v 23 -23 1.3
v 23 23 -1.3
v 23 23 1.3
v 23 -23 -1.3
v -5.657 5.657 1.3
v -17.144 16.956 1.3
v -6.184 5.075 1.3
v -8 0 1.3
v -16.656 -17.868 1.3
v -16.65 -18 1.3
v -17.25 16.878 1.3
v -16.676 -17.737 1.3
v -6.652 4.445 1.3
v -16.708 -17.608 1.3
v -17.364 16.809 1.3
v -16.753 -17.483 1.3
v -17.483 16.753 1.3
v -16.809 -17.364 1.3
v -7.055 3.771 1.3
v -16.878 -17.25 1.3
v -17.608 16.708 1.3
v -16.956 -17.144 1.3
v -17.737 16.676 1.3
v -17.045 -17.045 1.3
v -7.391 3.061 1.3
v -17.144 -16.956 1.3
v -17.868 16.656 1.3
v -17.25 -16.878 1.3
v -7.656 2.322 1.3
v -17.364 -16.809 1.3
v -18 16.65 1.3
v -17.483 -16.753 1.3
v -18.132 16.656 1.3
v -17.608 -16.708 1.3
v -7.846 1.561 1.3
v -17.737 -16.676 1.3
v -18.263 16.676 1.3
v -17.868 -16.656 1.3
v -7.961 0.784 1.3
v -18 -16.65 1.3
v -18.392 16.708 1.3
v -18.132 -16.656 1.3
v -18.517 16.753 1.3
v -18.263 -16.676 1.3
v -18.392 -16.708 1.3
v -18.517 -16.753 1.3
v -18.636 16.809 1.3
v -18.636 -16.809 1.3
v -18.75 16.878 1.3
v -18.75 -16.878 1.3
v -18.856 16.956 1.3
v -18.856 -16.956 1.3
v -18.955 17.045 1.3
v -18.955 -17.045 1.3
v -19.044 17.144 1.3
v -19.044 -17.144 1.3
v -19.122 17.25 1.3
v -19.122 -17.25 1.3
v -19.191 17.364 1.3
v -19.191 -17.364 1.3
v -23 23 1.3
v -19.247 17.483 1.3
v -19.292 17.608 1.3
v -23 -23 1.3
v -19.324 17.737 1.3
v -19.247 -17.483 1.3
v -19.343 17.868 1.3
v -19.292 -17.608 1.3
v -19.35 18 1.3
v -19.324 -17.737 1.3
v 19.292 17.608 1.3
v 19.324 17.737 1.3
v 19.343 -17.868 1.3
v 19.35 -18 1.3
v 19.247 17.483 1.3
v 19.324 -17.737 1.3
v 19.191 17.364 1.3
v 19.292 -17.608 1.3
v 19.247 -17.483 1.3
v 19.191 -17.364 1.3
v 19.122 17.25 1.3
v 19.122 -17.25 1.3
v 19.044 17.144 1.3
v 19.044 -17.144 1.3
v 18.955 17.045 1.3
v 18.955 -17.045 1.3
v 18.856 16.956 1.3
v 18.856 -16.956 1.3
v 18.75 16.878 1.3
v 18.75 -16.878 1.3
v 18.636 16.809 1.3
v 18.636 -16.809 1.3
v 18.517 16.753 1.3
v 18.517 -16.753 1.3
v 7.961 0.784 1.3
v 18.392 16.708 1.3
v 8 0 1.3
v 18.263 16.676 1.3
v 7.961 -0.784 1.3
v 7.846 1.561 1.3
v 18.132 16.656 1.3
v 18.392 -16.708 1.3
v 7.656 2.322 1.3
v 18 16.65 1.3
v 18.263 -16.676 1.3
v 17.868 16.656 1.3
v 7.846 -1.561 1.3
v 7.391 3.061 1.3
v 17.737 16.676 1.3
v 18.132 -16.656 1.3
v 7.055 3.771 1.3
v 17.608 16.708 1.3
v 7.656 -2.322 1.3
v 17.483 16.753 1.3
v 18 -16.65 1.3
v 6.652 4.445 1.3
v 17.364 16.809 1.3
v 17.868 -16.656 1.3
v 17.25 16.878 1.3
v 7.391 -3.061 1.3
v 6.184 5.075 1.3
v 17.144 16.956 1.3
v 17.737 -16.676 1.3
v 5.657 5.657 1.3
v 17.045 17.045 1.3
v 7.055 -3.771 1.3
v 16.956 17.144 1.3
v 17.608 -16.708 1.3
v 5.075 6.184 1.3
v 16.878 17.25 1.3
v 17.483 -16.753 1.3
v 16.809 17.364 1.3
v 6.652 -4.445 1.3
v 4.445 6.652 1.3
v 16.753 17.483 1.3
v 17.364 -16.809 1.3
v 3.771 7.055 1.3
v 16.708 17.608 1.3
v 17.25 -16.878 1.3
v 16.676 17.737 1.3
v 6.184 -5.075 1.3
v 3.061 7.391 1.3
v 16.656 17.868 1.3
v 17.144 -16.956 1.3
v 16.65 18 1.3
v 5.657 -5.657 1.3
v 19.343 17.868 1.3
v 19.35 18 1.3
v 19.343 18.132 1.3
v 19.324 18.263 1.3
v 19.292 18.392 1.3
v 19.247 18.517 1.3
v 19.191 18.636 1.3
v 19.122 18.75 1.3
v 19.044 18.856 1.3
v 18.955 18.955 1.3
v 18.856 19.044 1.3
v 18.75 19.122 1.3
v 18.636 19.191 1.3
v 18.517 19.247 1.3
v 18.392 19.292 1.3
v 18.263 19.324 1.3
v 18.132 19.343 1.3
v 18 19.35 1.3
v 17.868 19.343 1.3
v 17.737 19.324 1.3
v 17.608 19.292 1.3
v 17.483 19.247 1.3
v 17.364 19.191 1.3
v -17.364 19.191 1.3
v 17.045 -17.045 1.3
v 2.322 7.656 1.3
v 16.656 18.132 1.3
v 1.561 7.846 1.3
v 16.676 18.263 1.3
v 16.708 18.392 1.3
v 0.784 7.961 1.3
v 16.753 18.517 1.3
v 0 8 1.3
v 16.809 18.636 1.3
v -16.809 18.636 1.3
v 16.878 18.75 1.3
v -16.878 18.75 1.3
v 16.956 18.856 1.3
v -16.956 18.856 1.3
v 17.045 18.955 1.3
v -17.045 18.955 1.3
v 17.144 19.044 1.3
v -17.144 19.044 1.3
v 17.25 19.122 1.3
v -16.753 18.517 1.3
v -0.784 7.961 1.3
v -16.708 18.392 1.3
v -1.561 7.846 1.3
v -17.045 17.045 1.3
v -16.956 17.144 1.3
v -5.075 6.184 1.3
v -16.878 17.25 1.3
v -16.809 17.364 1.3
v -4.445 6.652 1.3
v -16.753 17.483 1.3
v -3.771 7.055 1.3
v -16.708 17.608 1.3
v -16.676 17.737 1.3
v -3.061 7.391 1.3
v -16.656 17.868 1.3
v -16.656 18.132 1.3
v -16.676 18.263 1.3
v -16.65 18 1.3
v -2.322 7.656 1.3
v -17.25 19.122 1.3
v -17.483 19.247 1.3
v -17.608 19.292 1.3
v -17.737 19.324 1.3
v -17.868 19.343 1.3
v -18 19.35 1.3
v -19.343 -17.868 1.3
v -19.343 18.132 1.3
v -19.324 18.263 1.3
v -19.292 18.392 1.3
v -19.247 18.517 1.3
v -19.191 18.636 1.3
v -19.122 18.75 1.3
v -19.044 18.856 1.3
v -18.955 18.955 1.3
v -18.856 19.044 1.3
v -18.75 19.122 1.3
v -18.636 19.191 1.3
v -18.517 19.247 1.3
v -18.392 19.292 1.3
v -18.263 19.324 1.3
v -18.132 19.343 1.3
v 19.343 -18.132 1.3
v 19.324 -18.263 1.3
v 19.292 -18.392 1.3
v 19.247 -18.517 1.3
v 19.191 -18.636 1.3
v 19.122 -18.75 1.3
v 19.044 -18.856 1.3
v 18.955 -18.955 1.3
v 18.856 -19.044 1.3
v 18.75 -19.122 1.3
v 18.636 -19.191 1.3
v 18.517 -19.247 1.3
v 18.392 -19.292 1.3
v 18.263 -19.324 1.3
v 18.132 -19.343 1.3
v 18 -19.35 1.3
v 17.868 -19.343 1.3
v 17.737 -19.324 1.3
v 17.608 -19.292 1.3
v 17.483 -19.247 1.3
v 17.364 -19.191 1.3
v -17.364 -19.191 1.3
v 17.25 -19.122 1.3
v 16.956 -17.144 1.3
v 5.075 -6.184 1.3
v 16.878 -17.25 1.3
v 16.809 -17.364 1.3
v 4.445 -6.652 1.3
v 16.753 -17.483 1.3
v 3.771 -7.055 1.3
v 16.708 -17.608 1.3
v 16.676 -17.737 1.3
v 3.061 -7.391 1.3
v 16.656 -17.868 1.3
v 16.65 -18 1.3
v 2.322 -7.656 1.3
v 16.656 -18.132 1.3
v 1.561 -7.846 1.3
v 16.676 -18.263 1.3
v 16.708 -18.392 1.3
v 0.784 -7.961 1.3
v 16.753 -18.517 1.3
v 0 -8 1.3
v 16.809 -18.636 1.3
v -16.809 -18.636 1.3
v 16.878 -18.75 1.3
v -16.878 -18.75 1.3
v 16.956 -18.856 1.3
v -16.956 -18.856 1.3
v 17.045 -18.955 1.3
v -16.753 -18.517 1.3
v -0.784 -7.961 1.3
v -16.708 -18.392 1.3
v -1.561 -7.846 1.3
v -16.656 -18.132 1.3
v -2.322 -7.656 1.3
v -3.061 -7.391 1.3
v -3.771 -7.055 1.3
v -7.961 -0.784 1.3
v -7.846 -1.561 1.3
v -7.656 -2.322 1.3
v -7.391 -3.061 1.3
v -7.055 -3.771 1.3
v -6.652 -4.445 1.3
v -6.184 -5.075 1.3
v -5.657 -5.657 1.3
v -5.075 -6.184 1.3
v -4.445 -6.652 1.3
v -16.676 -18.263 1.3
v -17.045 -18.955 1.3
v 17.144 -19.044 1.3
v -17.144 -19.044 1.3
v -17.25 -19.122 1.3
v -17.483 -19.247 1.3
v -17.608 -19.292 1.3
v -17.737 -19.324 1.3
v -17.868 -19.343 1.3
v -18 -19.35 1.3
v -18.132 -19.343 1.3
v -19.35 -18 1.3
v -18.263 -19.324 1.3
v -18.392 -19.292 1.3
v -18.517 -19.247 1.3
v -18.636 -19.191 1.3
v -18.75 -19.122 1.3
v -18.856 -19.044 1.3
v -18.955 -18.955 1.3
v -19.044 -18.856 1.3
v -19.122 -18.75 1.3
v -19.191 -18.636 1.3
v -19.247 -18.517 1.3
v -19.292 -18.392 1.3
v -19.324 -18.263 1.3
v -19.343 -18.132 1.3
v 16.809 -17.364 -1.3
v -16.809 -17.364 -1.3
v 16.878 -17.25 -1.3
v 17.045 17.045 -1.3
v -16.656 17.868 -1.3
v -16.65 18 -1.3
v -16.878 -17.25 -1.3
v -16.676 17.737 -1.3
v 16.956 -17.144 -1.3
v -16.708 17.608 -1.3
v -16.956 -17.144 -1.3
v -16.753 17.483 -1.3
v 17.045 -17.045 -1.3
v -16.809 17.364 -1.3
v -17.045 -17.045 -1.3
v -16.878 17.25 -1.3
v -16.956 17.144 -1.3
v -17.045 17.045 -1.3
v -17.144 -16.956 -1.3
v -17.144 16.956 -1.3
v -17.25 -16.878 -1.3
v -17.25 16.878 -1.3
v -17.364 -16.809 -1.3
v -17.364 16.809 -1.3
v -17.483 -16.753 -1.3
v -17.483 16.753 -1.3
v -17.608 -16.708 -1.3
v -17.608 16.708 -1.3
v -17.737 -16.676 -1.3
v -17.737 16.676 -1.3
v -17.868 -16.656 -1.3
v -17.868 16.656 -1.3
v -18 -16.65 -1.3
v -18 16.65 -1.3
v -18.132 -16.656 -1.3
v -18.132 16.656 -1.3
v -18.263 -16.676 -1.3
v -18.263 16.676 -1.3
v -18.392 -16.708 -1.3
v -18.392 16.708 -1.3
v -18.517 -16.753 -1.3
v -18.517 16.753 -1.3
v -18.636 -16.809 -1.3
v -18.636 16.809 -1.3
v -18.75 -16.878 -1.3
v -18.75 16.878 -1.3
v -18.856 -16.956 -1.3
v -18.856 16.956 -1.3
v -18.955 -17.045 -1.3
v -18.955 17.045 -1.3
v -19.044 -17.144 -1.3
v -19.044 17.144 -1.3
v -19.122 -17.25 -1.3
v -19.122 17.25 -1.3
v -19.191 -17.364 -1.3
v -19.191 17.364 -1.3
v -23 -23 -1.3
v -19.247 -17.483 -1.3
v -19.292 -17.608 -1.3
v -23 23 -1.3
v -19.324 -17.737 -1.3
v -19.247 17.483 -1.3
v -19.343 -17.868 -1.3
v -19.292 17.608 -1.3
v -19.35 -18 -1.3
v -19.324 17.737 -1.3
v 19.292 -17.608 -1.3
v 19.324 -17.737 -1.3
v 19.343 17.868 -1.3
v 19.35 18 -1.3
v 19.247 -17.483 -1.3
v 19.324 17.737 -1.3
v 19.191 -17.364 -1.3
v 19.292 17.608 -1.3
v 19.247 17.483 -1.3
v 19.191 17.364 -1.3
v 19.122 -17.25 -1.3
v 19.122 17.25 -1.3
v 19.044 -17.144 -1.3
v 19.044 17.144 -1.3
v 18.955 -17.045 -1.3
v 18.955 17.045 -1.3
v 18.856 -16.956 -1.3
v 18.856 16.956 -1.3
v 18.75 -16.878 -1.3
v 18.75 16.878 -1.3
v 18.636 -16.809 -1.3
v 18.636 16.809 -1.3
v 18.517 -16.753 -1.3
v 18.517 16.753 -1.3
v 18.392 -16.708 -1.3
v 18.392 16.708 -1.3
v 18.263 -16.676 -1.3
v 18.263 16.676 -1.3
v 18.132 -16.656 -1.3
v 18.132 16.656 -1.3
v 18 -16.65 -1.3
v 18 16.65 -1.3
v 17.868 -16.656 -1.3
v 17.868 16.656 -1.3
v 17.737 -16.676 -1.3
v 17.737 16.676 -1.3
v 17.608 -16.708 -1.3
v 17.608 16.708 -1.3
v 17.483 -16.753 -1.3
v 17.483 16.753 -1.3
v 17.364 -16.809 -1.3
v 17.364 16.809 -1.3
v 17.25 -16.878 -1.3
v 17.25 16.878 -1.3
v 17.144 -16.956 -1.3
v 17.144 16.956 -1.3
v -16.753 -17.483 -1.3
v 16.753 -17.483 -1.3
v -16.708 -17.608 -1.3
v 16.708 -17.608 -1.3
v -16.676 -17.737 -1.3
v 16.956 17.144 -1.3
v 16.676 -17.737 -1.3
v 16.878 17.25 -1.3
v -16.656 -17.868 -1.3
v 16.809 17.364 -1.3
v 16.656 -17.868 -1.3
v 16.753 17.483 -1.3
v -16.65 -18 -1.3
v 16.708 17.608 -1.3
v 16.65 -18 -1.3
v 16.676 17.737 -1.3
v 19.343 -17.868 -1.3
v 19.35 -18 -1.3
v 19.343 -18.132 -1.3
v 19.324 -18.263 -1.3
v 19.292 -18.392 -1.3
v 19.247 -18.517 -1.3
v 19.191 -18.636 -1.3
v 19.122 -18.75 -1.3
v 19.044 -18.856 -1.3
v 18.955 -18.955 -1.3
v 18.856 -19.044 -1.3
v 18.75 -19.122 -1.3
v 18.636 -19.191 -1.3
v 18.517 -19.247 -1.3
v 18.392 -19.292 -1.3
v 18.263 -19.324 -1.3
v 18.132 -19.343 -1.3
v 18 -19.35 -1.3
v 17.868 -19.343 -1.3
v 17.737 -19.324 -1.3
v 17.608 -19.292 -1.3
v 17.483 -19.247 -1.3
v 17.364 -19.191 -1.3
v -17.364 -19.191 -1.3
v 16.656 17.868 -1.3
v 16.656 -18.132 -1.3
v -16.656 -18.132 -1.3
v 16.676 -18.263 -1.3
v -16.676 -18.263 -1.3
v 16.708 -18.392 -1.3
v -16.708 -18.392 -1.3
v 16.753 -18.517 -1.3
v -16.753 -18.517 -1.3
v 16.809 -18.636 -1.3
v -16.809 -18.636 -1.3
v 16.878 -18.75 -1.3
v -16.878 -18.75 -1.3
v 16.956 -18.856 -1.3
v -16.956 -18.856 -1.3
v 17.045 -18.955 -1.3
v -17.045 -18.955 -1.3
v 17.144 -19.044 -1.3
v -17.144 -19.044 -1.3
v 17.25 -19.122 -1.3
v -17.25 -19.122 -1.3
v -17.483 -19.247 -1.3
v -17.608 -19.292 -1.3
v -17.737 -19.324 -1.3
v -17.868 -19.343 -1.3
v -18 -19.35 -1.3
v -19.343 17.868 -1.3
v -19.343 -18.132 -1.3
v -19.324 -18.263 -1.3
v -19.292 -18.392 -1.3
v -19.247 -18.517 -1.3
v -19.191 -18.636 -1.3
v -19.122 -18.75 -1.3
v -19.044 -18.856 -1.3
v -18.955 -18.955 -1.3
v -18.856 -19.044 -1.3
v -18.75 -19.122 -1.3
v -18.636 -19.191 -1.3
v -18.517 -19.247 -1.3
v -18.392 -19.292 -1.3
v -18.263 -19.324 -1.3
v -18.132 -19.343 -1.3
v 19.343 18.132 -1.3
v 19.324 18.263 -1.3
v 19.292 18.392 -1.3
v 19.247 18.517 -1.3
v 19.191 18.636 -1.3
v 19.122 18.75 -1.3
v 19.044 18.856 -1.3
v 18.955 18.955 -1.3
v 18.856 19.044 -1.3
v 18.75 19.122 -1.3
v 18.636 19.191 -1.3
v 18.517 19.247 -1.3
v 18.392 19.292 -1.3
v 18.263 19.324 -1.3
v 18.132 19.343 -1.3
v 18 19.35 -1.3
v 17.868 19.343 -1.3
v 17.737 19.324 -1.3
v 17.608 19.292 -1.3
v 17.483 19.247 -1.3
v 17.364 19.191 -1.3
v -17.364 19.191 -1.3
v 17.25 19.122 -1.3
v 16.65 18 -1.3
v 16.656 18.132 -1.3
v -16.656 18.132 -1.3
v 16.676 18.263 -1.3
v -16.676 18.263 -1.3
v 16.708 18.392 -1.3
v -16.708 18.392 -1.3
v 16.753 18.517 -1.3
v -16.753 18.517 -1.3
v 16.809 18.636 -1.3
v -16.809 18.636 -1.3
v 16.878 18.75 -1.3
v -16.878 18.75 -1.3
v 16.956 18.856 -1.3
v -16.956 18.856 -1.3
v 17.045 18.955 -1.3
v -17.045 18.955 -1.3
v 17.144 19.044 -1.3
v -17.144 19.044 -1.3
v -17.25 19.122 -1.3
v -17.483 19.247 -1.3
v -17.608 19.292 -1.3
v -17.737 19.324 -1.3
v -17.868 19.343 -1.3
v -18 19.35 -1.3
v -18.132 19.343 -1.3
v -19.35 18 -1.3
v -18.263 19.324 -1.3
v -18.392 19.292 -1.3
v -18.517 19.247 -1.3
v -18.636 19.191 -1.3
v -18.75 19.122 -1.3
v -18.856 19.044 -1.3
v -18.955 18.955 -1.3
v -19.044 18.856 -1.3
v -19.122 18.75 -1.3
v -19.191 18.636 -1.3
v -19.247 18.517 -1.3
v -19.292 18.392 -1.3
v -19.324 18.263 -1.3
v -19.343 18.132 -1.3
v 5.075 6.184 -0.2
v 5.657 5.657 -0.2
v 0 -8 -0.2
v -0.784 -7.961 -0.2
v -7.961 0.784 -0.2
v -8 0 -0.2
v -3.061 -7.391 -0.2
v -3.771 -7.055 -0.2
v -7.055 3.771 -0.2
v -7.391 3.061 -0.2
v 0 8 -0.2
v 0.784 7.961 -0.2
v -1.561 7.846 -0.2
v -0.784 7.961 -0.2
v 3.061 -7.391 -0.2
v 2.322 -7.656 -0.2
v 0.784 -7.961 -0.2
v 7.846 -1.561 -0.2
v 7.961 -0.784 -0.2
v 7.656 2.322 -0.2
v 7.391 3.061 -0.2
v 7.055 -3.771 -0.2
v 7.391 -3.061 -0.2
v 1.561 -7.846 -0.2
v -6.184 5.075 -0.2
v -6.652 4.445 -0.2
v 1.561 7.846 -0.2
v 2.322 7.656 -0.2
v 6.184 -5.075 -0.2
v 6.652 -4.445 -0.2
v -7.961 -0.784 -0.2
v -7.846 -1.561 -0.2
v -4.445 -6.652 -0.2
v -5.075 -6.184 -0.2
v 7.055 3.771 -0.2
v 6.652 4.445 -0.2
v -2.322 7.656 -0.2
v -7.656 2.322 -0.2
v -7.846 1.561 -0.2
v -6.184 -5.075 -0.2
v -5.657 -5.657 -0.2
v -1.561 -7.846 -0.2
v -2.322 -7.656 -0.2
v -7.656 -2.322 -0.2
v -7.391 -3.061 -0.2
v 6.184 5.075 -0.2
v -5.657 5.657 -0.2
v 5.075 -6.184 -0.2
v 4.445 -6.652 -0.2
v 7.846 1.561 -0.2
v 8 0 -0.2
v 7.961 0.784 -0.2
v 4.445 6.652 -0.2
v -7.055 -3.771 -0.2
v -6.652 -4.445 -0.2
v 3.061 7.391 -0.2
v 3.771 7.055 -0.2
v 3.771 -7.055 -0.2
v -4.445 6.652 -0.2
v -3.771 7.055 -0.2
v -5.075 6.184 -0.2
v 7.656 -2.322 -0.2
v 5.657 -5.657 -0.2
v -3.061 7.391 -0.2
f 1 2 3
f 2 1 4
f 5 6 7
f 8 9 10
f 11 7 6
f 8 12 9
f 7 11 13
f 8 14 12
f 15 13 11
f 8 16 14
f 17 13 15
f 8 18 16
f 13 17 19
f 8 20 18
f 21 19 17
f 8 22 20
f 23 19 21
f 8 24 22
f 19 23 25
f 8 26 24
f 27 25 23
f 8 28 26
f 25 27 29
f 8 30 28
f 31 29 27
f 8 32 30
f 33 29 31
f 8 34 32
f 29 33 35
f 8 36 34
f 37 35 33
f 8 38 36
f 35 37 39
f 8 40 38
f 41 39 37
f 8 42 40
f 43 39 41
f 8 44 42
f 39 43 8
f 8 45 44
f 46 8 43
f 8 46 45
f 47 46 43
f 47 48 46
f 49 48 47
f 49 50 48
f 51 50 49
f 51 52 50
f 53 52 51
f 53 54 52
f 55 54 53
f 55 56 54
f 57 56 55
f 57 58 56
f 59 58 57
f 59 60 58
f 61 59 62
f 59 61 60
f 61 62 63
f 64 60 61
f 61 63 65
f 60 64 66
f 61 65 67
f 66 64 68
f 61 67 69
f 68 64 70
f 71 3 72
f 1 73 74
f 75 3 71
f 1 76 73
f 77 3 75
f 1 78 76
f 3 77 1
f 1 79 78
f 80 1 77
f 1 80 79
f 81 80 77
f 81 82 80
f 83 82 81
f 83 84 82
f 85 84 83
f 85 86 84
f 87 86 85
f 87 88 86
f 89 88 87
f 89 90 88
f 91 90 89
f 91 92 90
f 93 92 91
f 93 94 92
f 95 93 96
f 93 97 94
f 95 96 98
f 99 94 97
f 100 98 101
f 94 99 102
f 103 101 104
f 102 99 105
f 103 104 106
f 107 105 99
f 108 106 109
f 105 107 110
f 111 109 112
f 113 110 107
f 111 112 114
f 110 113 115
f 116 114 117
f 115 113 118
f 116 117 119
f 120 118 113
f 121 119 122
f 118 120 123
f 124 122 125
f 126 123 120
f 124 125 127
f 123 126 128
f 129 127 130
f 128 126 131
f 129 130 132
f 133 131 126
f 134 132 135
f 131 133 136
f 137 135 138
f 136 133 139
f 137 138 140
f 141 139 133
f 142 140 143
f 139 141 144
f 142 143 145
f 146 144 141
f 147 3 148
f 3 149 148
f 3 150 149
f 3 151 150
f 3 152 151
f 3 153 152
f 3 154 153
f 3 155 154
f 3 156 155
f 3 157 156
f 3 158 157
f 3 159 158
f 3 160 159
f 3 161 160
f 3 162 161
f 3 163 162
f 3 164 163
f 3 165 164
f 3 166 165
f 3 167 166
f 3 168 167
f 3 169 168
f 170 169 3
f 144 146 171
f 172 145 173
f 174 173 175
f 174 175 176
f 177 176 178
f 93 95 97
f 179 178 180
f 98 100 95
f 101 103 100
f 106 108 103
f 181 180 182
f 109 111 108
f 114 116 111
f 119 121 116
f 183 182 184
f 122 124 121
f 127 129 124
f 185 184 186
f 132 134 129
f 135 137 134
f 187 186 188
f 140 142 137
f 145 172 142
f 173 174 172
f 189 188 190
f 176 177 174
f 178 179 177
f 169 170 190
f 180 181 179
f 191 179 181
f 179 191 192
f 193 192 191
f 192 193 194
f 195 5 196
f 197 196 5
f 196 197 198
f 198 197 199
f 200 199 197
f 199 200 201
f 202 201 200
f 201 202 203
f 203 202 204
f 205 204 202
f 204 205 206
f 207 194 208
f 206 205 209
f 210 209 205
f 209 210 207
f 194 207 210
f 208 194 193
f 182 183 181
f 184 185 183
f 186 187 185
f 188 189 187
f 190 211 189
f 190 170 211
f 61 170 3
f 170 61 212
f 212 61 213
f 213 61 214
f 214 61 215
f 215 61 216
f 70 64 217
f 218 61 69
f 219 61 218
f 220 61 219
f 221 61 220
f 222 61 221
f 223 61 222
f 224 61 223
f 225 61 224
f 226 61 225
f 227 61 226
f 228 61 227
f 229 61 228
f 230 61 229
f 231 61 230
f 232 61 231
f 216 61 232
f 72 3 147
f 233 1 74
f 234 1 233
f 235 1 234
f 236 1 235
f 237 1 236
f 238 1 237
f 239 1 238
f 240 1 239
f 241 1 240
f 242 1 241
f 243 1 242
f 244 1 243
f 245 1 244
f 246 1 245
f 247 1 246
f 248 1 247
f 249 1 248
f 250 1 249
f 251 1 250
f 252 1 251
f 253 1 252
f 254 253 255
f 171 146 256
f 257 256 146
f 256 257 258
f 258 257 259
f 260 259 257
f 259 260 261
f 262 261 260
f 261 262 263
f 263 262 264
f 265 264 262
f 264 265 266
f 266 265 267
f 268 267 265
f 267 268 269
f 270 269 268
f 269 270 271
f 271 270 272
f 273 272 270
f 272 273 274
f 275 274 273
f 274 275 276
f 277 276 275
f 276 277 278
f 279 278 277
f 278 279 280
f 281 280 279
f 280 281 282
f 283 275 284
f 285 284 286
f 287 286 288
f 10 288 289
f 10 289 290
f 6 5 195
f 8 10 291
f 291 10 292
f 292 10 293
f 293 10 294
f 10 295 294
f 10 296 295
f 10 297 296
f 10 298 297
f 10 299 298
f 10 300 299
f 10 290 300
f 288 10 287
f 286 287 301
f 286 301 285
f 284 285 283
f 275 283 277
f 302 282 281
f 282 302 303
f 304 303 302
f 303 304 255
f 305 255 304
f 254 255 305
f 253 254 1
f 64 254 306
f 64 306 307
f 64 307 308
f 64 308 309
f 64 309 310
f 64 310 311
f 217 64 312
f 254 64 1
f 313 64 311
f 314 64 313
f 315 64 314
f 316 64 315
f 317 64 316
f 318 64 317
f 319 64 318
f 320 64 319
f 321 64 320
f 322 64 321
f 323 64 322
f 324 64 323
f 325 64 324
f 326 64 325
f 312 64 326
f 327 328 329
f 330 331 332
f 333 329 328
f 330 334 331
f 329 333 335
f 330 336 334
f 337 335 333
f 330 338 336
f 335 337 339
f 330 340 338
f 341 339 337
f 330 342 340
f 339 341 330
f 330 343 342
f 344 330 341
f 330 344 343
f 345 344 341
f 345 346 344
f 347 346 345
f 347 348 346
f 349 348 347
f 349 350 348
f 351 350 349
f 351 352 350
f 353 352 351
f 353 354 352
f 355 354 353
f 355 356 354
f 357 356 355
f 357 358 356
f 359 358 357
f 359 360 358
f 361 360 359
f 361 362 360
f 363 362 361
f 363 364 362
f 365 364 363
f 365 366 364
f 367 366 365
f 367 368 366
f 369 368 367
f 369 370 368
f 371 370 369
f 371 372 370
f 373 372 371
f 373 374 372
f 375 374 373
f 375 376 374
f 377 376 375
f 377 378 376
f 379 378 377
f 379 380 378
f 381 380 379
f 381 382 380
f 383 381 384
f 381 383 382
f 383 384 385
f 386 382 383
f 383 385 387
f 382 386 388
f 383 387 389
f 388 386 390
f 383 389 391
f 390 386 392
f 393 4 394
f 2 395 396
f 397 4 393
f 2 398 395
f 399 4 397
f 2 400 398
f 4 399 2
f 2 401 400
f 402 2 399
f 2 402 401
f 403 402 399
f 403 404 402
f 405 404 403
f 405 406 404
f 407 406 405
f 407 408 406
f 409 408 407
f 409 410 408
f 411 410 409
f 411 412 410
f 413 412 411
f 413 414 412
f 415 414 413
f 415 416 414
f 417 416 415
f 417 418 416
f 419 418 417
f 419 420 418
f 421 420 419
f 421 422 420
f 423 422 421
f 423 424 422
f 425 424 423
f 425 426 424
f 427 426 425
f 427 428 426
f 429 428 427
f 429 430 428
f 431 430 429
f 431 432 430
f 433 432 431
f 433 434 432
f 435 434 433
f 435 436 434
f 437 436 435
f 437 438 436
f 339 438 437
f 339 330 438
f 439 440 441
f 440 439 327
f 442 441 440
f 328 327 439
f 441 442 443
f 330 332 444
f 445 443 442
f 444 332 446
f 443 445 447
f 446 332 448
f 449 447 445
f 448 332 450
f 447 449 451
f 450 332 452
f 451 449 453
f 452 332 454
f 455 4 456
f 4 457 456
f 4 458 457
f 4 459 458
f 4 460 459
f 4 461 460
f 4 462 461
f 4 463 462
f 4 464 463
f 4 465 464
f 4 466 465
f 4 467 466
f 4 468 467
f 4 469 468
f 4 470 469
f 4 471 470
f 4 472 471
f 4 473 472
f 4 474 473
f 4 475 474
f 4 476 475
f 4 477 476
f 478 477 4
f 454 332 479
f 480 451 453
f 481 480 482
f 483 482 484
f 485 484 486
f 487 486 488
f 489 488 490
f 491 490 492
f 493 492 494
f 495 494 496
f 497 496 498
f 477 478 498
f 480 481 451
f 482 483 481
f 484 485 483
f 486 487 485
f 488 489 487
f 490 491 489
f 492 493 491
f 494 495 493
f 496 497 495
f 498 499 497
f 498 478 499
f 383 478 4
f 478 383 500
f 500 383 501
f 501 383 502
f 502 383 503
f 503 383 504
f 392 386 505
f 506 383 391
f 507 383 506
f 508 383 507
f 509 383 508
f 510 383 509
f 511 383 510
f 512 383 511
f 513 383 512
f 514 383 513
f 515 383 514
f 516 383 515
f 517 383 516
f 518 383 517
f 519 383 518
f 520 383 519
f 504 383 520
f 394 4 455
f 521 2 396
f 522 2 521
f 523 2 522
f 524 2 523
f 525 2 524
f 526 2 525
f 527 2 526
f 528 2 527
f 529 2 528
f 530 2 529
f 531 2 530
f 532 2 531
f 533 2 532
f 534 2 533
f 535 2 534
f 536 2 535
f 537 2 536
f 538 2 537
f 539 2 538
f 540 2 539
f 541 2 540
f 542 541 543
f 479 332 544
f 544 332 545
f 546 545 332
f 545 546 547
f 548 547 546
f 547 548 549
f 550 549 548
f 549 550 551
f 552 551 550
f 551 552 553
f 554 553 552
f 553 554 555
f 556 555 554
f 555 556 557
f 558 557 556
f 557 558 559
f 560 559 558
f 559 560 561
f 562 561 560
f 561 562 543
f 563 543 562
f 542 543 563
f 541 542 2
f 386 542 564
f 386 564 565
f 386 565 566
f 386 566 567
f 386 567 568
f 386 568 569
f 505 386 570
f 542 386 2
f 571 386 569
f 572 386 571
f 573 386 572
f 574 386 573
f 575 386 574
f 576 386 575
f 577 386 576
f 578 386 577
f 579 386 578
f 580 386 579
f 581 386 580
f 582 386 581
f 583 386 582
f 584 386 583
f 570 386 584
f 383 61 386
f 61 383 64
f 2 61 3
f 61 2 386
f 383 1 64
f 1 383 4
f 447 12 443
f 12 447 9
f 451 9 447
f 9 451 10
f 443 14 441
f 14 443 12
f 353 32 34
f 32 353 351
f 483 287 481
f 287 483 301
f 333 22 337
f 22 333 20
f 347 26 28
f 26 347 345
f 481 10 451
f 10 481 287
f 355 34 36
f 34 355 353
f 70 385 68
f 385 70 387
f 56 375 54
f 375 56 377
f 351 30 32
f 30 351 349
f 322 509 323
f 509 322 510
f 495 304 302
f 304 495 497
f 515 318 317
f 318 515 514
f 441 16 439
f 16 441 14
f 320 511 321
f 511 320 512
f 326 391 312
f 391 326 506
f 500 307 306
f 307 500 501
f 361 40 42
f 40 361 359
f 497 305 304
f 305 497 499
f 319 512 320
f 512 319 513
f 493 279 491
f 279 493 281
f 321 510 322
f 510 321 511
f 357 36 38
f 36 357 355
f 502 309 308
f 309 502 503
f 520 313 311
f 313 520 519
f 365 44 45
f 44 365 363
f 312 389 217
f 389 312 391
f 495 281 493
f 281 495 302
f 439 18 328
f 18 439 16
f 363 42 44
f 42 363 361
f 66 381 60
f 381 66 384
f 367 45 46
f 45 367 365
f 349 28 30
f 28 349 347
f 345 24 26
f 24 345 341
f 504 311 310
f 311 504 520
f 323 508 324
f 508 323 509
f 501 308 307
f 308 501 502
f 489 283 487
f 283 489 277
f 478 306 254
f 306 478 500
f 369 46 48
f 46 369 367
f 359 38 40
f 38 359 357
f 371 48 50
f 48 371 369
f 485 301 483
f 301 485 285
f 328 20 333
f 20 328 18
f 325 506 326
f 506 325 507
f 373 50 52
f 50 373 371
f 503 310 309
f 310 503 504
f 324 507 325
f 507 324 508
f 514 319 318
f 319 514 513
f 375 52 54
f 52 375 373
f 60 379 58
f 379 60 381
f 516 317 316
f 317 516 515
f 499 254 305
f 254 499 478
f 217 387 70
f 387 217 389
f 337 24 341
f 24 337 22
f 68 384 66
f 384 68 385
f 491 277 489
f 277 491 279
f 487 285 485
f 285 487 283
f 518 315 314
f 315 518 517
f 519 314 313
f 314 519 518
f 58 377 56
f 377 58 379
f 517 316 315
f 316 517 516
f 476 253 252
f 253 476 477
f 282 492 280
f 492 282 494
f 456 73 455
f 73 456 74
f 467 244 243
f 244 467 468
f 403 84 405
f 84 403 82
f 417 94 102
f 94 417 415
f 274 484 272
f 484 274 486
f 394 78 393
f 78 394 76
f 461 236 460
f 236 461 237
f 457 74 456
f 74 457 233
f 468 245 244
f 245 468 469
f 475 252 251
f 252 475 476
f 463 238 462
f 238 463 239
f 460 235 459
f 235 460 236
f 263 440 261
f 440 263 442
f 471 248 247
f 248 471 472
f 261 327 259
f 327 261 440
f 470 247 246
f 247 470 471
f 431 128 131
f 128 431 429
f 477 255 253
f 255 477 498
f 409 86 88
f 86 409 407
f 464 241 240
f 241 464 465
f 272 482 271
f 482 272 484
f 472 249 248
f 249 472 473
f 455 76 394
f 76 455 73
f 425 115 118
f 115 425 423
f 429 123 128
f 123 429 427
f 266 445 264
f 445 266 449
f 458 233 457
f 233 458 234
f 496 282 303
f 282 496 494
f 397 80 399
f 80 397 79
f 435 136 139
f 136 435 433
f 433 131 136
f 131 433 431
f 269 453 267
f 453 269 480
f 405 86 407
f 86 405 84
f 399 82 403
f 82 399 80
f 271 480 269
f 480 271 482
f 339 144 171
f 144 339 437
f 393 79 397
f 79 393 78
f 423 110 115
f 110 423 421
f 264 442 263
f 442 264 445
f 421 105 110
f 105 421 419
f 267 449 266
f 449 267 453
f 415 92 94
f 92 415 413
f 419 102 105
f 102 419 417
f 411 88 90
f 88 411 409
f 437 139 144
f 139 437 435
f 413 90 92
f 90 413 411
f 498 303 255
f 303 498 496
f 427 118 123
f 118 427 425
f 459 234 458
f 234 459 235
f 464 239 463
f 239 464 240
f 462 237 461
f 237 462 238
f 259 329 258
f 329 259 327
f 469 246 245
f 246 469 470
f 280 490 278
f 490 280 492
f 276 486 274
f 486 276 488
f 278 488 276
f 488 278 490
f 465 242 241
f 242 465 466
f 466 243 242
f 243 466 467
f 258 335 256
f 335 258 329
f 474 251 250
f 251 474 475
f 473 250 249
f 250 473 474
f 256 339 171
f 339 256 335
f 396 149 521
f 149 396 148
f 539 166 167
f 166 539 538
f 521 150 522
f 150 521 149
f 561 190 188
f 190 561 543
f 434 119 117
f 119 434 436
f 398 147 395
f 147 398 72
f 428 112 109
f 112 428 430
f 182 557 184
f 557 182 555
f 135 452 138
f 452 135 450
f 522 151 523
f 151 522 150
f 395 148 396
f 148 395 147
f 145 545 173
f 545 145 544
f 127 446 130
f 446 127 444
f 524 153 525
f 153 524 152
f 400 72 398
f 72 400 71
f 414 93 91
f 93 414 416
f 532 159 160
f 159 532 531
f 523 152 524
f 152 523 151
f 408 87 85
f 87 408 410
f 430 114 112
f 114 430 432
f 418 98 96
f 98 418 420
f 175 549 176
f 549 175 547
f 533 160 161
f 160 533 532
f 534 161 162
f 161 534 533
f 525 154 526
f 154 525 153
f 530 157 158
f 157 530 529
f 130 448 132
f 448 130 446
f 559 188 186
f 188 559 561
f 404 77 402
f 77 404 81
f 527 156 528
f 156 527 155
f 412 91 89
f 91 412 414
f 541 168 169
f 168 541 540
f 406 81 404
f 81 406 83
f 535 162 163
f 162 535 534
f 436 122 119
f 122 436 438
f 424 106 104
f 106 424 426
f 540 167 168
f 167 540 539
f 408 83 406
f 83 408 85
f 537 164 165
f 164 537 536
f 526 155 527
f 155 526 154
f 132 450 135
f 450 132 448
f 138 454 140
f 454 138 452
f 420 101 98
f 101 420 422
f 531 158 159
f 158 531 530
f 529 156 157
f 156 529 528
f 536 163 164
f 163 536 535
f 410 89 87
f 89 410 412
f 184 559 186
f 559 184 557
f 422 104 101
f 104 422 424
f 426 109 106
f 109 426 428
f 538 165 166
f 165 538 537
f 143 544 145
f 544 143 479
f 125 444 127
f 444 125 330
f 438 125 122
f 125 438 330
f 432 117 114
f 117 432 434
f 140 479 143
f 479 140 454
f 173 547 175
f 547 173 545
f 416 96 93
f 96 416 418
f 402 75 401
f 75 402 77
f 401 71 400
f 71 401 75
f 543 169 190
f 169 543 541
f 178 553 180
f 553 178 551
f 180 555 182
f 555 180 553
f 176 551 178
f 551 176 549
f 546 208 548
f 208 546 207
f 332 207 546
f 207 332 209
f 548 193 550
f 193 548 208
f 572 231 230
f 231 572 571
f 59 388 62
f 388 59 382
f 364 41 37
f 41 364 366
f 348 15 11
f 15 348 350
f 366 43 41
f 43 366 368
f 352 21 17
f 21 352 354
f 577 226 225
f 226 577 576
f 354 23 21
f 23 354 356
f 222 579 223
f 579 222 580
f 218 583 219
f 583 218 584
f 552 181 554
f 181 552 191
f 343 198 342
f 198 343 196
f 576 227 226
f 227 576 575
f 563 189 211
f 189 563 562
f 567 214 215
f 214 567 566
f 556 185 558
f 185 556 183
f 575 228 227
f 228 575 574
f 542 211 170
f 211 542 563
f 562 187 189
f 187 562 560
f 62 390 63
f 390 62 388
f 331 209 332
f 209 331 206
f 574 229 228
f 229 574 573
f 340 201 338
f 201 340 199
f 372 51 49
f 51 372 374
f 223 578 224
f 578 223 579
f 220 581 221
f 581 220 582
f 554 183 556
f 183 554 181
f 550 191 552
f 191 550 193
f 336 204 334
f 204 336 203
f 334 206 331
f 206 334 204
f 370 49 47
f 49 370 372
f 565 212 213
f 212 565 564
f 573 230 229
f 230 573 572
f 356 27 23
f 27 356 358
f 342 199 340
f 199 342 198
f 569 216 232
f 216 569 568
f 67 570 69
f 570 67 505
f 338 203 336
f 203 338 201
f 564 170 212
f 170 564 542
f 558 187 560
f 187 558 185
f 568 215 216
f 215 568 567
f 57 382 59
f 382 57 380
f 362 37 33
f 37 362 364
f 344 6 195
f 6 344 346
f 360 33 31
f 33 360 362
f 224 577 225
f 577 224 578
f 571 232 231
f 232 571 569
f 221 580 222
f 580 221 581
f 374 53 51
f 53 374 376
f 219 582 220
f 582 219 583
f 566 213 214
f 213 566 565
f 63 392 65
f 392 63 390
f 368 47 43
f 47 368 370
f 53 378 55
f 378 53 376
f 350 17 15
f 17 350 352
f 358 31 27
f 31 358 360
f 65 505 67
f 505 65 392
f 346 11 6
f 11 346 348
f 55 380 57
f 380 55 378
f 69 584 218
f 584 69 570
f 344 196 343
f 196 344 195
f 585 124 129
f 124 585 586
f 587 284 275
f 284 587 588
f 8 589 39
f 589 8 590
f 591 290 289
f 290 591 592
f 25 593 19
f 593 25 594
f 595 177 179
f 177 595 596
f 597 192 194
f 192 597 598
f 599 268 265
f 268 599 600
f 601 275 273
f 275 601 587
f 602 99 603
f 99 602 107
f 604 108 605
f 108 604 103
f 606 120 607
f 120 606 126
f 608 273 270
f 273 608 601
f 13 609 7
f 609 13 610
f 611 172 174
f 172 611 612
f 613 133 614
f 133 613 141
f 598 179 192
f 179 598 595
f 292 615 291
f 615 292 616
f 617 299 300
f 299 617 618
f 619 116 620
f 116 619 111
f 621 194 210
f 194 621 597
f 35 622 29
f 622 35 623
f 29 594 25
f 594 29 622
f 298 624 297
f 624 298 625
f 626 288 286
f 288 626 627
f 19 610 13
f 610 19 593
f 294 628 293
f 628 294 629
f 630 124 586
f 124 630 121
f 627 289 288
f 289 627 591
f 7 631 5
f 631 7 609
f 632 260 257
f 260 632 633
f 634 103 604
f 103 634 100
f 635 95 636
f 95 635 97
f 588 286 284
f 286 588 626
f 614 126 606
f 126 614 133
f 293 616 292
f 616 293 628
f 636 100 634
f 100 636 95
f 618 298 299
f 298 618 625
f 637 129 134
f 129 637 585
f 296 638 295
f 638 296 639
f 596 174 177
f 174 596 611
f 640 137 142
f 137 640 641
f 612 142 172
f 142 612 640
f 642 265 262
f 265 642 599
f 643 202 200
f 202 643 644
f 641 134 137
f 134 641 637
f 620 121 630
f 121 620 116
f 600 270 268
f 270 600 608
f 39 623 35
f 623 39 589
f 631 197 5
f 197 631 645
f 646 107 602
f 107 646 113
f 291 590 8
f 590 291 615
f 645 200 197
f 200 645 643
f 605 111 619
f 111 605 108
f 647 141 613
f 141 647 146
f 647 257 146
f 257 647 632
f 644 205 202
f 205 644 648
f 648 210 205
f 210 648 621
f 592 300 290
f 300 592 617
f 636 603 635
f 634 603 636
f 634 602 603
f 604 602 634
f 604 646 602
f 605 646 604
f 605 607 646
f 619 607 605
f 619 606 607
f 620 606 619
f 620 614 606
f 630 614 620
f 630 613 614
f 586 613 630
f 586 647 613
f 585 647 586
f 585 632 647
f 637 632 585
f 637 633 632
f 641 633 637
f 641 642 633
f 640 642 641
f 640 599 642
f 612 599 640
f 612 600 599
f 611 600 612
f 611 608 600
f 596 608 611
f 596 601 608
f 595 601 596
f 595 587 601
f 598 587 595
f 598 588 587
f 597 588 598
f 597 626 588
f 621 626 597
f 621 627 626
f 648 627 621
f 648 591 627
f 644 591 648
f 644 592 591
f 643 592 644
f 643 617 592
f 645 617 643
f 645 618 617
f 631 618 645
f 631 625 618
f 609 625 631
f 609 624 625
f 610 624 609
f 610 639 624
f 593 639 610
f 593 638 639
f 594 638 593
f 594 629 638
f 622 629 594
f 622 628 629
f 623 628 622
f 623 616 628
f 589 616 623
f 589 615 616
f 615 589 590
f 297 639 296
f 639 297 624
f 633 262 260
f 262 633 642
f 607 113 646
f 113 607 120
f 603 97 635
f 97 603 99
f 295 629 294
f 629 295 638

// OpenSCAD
// ============================================================================
// Atom Lithography Machine — Parametric OpenSCAD Module (S7.3-02)
// ============================================================================
// part_id           : S7.3-02
// parent_bom_id     : S7.3
// subsystem         : S7
// part_name         : Kriyojenik 4 K BGA/tel-bag cip tasiyici PCB ve ara-katmanlari
// material          : Invar-36
// temp_stage        : 4 K
// vacuum_grade      : Kriyo-vakum
// tolerance         : ±25 um
// computed_mass_kg  : 0.41889
// envelope_mm       : 61.000 x 61.000 x 46.000
// design_maturity   : M0_M1_DETAILED_CAD_DESIGN_ONLY
// no_lab_measurement: true
// iec61508_certified: false
// semi_s2_certified : false
// Units: millimeters (mm)
// ============================================================================

$fn = 64;

// Nominal bounding envelope parameters (mm)
bbox_x = 61.0000;
bbox_y = 61.0000;
bbox_z = 46.0000;

// Part-specific parametric dimensions
qty_carriers = 10;
carrier_sq_mm = 46.0;
cavity_sq_mm = 16.0;
carrier_t_mm = 2.6;

// Interface / port parameters (mm)
port_cic_thermal_base_bolts = 4;

module part_S7_3_02() {
  difference() {
    union() {
      // Cu-Invar-Cu / Rogers carrier unit
      cube([46.000, 46.000, 2.600], center=true);
    }
    // M2.5 hole #1
    translate([-18.000, -18.000, 0.000]) cylinder(d=2.700, h=6.000, center=true);
    // M2.5 hole #2
    translate([18.000, -18.000, 0.000]) cylinder(d=2.700, h=6.000, center=true);
    // M2.5 hole #3
    translate([18.000, 18.000, 0.000]) cylinder(d=2.700, h=6.000, center=true);
    // M2.5 hole #4
    translate([-18.000, 18.000, 0.000]) cylinder(d=2.700, h=6.000, center=true);
    // 16x16 mm wirebond cavity
    translate([0.000, 0.000, 0.800]) {
      hull() {
        translate([-0.000, 0, 0]) cylinder(d=16.000, h=2.000, center=true);
        translate([0.000, 0, 0]) cylinder(d=16.000, h=2.000, center=true);
      }
    }
  }
}

// World assembly mounting transform (global machine frame, mm / deg):
// translate([960.000, 780.000, 810.000]) rotate([0.000, 0.000, 0.000]) part_S7_3_02();

part_S7_3_02();
